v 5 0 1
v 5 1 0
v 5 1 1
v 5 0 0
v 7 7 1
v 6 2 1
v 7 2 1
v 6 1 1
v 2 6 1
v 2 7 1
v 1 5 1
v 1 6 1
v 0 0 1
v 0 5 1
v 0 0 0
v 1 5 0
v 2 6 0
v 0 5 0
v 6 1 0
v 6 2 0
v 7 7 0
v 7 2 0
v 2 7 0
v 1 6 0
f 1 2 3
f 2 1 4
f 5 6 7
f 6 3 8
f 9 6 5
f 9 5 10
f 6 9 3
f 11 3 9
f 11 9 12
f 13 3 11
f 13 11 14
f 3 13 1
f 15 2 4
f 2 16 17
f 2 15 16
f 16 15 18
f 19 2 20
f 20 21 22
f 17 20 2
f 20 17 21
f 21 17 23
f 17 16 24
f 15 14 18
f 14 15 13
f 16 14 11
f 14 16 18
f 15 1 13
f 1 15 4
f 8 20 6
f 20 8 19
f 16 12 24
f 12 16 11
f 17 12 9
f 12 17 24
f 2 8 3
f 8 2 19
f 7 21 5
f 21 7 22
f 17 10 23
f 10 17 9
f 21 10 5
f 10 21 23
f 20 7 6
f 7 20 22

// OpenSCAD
h=1;

for(i=[0:2]){
translate([i,i,0])cube([5,5,h]);
}
